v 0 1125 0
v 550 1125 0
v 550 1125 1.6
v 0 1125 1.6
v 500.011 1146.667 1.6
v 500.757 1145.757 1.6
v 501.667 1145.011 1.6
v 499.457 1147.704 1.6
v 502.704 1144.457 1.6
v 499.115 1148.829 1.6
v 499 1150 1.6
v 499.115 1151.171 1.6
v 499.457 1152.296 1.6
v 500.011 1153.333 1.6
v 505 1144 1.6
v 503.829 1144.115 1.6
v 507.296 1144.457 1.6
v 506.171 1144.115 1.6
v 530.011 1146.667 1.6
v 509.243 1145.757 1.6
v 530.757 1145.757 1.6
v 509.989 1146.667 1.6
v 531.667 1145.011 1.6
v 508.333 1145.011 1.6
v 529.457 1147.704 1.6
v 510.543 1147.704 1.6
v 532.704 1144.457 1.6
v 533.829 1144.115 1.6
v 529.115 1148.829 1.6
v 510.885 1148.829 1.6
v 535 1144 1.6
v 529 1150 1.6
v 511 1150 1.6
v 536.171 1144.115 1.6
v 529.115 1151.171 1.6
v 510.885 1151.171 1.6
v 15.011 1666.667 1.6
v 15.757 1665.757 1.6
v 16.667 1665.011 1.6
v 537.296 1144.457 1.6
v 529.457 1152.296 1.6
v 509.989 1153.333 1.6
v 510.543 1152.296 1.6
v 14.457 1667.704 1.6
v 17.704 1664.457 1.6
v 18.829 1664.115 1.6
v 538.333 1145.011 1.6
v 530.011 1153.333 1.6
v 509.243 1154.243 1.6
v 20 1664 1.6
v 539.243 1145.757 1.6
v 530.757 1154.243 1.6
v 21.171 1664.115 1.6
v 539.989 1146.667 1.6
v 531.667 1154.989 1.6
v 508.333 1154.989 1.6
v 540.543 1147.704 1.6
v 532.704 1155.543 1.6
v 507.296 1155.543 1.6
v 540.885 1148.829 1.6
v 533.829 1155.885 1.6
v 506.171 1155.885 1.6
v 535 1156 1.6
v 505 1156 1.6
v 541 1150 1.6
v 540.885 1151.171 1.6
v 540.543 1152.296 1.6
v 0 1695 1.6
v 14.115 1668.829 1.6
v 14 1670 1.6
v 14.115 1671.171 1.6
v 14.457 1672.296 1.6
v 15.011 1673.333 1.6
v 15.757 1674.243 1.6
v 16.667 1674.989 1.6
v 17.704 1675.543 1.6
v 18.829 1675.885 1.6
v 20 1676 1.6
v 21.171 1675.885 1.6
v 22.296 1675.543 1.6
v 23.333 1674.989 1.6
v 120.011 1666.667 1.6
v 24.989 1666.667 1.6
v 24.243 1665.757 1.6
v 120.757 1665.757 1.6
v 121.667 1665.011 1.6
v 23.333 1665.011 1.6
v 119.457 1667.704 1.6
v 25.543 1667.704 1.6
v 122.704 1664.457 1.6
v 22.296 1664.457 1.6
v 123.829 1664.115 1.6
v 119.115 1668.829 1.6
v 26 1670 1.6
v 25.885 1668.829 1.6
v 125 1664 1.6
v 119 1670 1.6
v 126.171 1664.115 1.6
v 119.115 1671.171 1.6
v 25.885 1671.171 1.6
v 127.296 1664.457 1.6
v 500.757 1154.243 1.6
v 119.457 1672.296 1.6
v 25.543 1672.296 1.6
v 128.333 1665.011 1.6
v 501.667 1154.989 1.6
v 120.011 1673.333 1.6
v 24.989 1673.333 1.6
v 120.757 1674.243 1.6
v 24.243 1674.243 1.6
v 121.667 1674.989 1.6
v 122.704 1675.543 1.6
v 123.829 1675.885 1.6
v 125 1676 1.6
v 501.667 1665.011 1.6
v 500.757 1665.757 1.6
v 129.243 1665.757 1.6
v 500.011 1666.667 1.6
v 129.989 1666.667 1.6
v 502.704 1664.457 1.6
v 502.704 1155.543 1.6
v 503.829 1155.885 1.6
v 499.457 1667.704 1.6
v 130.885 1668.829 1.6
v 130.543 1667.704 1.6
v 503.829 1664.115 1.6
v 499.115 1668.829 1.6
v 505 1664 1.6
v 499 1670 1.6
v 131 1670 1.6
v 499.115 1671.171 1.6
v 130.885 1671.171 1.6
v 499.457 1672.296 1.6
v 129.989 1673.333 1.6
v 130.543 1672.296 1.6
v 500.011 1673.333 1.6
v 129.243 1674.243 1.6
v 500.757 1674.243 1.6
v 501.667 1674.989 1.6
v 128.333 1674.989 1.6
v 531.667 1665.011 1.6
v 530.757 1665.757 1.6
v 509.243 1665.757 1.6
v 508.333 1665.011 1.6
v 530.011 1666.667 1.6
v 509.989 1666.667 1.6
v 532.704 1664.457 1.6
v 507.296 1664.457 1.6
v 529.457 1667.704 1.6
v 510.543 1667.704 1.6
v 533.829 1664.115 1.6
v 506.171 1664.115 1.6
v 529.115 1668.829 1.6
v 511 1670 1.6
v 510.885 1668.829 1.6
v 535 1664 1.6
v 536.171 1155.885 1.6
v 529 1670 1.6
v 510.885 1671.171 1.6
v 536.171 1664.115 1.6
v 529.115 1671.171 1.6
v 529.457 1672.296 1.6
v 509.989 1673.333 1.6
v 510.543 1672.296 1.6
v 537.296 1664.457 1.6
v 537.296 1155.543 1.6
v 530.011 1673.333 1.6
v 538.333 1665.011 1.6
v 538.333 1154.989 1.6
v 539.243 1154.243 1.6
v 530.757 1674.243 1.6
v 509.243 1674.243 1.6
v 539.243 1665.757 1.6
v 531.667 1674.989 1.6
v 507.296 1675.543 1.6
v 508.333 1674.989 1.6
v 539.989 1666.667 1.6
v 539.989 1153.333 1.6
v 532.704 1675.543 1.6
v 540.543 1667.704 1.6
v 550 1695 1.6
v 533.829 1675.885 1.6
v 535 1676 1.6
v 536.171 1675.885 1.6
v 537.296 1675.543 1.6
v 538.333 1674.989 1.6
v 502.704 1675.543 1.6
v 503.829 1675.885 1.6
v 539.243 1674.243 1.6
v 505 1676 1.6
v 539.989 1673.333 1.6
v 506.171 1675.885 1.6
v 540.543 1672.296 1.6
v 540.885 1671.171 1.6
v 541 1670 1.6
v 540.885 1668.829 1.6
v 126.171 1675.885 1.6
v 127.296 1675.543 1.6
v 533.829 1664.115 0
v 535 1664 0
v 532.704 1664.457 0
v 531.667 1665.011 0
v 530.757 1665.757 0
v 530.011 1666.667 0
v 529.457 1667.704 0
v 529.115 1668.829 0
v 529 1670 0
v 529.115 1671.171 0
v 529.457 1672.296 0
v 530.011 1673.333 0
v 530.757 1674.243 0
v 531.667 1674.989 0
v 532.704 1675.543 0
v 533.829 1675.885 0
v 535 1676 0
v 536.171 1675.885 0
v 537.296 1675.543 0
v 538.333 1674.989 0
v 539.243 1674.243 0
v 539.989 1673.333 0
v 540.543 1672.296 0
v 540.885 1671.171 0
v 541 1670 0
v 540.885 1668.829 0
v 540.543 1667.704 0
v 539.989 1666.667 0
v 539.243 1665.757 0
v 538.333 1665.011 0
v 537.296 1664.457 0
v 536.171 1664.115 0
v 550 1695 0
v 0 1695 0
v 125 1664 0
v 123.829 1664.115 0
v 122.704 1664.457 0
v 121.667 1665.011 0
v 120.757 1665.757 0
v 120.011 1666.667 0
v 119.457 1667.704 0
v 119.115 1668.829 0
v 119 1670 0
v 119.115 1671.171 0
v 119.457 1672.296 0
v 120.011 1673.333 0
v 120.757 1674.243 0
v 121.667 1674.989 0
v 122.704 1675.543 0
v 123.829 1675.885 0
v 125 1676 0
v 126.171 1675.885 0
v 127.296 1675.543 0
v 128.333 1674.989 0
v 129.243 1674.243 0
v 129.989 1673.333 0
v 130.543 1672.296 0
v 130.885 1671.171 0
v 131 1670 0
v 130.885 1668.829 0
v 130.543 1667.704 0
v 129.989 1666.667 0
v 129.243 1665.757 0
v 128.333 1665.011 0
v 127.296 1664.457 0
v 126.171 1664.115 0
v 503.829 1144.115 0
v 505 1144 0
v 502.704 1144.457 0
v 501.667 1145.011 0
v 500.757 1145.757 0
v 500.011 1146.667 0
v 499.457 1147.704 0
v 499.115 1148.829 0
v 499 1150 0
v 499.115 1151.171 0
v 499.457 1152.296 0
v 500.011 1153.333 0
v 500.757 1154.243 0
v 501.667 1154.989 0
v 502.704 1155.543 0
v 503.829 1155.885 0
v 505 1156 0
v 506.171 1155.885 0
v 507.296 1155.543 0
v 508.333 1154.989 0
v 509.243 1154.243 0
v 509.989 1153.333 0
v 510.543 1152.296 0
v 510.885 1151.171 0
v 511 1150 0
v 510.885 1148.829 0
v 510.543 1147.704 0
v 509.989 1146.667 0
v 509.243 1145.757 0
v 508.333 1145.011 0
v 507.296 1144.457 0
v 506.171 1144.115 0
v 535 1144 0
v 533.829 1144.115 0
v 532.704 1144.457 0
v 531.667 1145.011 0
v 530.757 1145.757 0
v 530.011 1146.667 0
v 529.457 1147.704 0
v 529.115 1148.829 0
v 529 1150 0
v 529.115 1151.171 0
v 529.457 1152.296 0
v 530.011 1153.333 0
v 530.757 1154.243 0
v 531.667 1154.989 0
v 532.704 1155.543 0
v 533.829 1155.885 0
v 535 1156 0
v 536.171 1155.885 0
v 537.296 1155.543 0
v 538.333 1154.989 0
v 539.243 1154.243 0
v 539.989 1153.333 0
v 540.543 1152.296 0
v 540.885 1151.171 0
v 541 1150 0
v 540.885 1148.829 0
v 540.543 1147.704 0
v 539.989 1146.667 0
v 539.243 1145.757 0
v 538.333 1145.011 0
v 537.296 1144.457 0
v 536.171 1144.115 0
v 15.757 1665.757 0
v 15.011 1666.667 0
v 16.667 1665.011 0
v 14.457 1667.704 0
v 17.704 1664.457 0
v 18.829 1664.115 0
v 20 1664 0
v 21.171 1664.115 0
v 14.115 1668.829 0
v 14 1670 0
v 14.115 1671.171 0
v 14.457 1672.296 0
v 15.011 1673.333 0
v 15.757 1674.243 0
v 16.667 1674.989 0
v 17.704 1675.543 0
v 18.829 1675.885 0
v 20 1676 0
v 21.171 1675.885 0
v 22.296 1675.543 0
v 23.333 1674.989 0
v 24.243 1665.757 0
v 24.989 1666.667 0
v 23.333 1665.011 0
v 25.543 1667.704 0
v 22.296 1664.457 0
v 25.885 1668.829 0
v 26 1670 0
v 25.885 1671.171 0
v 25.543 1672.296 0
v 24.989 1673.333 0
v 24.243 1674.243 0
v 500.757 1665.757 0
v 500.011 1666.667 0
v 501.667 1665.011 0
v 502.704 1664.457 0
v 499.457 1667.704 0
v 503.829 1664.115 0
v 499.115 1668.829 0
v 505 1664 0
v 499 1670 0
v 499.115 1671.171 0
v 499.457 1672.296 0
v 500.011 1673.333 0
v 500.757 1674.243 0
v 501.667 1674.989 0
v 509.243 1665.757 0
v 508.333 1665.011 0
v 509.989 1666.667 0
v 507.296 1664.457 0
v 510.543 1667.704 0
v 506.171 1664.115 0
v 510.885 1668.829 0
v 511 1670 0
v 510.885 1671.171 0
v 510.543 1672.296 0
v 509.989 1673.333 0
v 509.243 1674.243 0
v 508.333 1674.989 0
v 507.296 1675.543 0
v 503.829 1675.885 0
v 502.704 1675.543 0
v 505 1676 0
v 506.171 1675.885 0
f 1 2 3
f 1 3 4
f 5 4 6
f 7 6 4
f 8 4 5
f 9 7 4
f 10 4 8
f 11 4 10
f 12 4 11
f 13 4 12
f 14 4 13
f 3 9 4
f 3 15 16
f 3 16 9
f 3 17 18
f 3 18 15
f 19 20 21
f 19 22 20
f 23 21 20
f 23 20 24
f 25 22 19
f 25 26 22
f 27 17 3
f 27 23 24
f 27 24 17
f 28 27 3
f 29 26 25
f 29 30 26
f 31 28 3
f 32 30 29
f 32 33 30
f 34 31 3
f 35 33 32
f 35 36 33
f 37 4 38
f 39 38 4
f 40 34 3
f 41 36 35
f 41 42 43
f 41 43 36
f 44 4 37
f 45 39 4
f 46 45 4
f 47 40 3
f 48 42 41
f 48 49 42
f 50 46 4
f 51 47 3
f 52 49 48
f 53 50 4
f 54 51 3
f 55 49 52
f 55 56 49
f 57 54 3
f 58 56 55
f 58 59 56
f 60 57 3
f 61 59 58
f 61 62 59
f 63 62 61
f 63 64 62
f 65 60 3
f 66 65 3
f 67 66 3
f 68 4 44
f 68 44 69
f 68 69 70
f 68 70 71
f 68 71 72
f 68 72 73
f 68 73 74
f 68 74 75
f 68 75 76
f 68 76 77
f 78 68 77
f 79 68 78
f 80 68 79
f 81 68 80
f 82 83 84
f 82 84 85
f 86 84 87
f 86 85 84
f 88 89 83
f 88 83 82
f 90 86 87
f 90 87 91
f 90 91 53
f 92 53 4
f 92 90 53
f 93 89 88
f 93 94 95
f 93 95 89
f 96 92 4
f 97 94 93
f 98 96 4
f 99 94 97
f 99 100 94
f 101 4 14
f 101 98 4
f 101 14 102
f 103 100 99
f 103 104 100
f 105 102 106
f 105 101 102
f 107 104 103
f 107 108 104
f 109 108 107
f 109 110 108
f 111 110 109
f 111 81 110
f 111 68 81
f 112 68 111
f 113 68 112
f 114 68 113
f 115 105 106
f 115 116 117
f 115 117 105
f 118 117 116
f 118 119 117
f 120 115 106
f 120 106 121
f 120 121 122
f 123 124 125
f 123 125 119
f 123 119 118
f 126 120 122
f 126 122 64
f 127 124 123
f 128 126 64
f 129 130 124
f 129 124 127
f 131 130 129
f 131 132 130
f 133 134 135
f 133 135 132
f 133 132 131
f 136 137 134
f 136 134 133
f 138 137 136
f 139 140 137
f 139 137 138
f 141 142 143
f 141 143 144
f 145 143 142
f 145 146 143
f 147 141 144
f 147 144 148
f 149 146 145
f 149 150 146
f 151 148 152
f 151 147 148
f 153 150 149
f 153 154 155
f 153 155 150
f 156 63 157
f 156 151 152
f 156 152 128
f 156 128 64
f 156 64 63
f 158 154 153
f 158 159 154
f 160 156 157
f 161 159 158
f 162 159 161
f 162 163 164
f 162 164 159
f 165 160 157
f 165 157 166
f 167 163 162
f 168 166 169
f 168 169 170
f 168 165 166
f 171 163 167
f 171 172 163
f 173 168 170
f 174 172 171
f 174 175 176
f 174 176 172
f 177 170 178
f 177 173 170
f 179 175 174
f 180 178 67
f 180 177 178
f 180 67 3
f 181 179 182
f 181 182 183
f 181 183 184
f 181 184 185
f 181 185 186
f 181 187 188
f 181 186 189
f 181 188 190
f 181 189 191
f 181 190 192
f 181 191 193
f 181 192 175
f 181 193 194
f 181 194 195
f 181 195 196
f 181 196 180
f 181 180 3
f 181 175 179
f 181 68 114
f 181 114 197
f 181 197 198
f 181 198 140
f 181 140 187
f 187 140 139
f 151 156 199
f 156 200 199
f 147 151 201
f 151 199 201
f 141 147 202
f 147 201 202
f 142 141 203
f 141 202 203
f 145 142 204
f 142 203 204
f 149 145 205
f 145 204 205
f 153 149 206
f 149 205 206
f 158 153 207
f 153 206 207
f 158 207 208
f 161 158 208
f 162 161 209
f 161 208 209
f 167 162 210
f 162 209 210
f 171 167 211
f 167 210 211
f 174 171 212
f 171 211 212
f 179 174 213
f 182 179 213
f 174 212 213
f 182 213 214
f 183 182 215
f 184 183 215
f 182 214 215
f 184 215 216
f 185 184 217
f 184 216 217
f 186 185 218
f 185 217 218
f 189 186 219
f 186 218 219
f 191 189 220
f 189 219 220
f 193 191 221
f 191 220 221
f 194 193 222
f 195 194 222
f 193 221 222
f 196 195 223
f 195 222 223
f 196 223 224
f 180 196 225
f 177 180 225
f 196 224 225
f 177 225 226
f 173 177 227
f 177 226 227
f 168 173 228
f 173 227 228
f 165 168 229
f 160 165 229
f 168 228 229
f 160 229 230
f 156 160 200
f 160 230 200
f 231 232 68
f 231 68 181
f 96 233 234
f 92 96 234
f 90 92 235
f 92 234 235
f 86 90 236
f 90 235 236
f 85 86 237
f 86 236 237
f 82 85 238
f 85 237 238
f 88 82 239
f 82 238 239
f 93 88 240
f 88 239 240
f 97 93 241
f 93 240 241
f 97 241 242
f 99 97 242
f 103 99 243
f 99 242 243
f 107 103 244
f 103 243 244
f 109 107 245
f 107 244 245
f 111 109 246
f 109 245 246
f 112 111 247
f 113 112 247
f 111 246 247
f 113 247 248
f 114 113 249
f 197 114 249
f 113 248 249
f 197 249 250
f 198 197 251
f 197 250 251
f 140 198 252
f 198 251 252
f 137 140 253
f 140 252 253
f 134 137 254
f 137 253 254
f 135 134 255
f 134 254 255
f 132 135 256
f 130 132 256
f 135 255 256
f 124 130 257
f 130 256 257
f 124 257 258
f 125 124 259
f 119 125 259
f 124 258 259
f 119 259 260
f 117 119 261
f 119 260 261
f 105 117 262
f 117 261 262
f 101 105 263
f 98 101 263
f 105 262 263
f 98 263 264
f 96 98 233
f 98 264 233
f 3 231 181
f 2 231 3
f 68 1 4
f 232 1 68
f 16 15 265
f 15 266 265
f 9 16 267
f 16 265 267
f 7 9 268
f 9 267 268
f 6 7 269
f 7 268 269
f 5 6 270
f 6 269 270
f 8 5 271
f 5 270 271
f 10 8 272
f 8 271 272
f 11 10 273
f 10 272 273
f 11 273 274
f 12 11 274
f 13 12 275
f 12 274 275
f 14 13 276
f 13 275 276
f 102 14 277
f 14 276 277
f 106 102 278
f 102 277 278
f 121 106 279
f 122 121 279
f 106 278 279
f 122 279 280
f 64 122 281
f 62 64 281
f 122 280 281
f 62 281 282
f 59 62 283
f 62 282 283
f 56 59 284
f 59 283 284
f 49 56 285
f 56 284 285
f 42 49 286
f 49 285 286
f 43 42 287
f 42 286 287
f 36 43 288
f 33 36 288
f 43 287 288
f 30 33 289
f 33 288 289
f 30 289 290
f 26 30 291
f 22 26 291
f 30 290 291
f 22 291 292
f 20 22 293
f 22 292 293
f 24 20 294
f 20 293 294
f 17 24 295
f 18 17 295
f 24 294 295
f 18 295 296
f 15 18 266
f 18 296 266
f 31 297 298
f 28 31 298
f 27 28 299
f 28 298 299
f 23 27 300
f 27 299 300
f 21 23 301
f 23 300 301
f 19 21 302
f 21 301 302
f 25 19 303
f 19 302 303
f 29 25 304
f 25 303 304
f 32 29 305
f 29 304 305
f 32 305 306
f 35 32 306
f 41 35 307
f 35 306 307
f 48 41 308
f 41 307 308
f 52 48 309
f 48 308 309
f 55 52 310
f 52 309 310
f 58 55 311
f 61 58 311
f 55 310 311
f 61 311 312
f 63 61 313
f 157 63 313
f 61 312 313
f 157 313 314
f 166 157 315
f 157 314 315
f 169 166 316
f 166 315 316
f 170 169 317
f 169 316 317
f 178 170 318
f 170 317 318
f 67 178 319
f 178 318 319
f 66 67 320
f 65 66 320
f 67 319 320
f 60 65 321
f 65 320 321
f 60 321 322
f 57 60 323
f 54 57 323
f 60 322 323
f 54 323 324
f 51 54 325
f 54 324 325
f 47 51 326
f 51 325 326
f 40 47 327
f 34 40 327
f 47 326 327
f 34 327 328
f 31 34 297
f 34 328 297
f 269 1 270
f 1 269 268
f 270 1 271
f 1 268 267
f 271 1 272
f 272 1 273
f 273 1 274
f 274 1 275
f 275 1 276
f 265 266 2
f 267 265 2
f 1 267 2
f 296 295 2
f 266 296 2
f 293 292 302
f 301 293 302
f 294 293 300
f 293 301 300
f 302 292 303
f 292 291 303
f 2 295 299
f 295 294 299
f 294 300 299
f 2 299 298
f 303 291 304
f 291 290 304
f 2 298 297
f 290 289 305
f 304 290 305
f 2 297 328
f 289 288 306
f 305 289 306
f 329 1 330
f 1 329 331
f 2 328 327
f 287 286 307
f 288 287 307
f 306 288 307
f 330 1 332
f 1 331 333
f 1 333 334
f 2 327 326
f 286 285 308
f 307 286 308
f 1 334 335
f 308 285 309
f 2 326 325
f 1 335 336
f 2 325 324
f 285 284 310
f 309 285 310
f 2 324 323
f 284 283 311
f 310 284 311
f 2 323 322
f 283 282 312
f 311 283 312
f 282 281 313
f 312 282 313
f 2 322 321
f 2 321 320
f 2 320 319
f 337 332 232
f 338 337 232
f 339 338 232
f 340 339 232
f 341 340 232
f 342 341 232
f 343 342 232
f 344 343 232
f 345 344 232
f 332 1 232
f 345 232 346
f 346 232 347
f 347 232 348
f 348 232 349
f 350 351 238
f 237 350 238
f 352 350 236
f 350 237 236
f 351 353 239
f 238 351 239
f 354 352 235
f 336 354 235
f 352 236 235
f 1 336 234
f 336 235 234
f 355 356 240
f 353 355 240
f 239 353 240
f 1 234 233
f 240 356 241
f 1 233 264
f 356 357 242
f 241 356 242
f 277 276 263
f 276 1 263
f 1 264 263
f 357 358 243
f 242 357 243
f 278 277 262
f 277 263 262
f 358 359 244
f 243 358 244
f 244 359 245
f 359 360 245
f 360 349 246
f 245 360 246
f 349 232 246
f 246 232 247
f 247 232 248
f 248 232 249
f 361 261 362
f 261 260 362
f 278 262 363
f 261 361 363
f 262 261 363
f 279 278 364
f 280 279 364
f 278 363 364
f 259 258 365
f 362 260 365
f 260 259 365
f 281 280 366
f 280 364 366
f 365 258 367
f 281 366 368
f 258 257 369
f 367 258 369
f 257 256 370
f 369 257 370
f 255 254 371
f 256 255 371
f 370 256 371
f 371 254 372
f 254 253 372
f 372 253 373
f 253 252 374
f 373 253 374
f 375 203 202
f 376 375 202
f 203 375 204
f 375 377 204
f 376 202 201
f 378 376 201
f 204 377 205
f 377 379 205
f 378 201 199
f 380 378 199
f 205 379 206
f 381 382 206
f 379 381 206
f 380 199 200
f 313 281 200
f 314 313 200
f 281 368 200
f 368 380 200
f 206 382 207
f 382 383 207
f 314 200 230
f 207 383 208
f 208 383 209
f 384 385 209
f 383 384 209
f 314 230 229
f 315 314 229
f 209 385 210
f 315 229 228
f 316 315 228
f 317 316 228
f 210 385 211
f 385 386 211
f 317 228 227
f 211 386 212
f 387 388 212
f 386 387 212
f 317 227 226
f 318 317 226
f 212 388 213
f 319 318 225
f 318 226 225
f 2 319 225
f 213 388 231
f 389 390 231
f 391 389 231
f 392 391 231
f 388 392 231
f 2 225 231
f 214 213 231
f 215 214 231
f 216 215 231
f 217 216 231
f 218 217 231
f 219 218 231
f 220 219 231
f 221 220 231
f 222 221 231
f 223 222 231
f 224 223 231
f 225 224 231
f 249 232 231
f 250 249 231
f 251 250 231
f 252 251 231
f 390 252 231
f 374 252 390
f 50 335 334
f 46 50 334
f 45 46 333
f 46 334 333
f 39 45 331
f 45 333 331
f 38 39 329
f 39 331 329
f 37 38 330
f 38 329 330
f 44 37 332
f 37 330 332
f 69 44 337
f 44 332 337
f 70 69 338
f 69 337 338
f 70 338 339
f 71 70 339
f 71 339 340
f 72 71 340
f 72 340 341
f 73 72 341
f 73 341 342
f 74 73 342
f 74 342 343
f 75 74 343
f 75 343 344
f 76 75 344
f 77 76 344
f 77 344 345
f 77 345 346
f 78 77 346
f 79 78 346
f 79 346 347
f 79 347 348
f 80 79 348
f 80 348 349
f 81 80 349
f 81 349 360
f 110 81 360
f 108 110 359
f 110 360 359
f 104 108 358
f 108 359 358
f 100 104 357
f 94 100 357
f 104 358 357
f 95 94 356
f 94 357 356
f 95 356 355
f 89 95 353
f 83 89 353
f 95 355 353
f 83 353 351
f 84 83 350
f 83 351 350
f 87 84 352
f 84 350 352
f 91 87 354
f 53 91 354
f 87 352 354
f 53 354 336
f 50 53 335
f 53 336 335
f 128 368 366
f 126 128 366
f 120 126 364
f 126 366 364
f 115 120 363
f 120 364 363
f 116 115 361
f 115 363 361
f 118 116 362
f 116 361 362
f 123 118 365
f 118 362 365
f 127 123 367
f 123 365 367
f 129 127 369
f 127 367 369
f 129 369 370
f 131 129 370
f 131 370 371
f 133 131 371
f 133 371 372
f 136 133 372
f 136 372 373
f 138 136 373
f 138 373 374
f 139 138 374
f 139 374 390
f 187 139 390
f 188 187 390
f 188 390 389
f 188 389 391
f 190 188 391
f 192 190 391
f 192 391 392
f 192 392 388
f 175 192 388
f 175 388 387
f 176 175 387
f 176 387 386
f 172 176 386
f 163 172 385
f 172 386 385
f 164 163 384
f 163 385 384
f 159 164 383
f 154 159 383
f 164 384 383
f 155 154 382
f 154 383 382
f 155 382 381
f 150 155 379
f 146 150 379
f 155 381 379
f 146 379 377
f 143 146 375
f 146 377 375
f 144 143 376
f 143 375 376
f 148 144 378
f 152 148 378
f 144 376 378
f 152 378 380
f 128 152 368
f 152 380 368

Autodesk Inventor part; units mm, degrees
ref_plane "YZ Plane" through (0, 0, 0) normal (1, 0, 0) x (0, 1, 0)
ref_plane "XZ Plane" through (0, 0, 0) normal (0, 1, 0) x (-1, 0, 0)
ref_plane "XY Plane" through (0, 0, 0) normal (0, 0, 1) x (1, 0, 0)
sketch "Sketch1" plane through (0, 0, 0) normal (0, 0, 1) x (1, 0, 0)
  line L0 (0, 1125) -> (0, 1695)
  line L1 (0, 1695) -> (550, 1695)
  line L2 (550, 1695) -> (550, 1125)
  line L3 (550, 1125) -> (0, 1125)
  point P0 (0, 0)
  dimension "d2" = 550
  dimension "d3" = 570
extrude "Plate1" add sketch "Sketch1" along normal blind 1.6
sketch "Sketch7" plane through (0, 0, 1.6) normal (0, 0, 1) x (1, 0, 0)
  line L0 (0, 1695) -> (550, 1695) projected
  line L1 (490, 1695) -> (490, 1125)
  line L2 (550, 1125) -> (0, 1125) projected
  line L3 (550, 1695) -> (550, 1125) projected
  circle A0 centre (535, 1670) radius 6
  circle A1 centre (505, 1670) radius 6
  circle A2 centre (535, 1150) radius 6
  circle A3 centre (505, 1150) radius 6
  point P0 (0, 0)
  point P1 (1.1647, 1695)
  point P2 (150, 1125)
  point P3 (1.1647, 1125)
  dimension "d57" = 60
  dimension "d58" = 12
  dimension "d59" = 12
  dimension "d60" = 15
  dimension "d61" = 15
  dimension "d62" = 25
  dimension "d63" = 25
  dimension "d64" = 12
  dimension "d65" = 12
  dimension "d66" = 25
  dimension "d67" = 25
  dimension "d75" = 15
  dimension "d76" = 15
hole "Hole3" at (535, 1670, 1.6) at (505, 1670, 1.6) at (535, 1150, 1.6) at (505, 1150, 1.6) direction (0, 0, -1) diameter 12 end through all
sketch "Sketch8" plane through (0, 0, 1.6) normal (0, 0, 1) x (1, 0, 0)
  line L0 (0, 1695) -> (0, 1125) projected
  line L1 (0, 1695) -> (145, 1695)
  line L2 (550, 1695) -> (0, 1695) projected
  line L3 (145, 1695) -> (145, 1125)
  line L4 (0, 1125) -> (550, 1125) projected
  circle A0 centre (125, 1670) radius 6
  circle A1 centre (20, 1670) radius 6
  point P0 (0, 0)
  dimension "d79" = 145
  dimension "d80" = 12
  dimension "d81" = 25
  dimension "d82" = 20
  dimension "d83" = 12
  dimension "d84" = 20
hole "Hole4" at (125, 1670, 1.6) at (20, 1670, 1.6) direction (0, 0, -1) diameter 12 end through all
equation "\"d73\" = Thickness"
equation "\"d90\" = Thickness"
equation "\"BendRadius\" = Thickness"
equation "\"BendReliefWidth\" = Thickness"
equation "\"BendReliefDepth\" = 0.5 * Thickness"
equation "\"CornerReliefSize\" = 4 * Thickness"
equation "\"MinimumRemnant\" = 2 * Thickness"
equation "\"TransitionRadius\" = BendRadius"
equation "\"JacobiRadiusSize\" = BendRadius"
equation "\"GapSize\" = Thickness"
equation "\"d4\" = BendRadius"
equation "\"Thickness\" = 1.6"
properties part number "MC Part2" material "Steel, Mild"
